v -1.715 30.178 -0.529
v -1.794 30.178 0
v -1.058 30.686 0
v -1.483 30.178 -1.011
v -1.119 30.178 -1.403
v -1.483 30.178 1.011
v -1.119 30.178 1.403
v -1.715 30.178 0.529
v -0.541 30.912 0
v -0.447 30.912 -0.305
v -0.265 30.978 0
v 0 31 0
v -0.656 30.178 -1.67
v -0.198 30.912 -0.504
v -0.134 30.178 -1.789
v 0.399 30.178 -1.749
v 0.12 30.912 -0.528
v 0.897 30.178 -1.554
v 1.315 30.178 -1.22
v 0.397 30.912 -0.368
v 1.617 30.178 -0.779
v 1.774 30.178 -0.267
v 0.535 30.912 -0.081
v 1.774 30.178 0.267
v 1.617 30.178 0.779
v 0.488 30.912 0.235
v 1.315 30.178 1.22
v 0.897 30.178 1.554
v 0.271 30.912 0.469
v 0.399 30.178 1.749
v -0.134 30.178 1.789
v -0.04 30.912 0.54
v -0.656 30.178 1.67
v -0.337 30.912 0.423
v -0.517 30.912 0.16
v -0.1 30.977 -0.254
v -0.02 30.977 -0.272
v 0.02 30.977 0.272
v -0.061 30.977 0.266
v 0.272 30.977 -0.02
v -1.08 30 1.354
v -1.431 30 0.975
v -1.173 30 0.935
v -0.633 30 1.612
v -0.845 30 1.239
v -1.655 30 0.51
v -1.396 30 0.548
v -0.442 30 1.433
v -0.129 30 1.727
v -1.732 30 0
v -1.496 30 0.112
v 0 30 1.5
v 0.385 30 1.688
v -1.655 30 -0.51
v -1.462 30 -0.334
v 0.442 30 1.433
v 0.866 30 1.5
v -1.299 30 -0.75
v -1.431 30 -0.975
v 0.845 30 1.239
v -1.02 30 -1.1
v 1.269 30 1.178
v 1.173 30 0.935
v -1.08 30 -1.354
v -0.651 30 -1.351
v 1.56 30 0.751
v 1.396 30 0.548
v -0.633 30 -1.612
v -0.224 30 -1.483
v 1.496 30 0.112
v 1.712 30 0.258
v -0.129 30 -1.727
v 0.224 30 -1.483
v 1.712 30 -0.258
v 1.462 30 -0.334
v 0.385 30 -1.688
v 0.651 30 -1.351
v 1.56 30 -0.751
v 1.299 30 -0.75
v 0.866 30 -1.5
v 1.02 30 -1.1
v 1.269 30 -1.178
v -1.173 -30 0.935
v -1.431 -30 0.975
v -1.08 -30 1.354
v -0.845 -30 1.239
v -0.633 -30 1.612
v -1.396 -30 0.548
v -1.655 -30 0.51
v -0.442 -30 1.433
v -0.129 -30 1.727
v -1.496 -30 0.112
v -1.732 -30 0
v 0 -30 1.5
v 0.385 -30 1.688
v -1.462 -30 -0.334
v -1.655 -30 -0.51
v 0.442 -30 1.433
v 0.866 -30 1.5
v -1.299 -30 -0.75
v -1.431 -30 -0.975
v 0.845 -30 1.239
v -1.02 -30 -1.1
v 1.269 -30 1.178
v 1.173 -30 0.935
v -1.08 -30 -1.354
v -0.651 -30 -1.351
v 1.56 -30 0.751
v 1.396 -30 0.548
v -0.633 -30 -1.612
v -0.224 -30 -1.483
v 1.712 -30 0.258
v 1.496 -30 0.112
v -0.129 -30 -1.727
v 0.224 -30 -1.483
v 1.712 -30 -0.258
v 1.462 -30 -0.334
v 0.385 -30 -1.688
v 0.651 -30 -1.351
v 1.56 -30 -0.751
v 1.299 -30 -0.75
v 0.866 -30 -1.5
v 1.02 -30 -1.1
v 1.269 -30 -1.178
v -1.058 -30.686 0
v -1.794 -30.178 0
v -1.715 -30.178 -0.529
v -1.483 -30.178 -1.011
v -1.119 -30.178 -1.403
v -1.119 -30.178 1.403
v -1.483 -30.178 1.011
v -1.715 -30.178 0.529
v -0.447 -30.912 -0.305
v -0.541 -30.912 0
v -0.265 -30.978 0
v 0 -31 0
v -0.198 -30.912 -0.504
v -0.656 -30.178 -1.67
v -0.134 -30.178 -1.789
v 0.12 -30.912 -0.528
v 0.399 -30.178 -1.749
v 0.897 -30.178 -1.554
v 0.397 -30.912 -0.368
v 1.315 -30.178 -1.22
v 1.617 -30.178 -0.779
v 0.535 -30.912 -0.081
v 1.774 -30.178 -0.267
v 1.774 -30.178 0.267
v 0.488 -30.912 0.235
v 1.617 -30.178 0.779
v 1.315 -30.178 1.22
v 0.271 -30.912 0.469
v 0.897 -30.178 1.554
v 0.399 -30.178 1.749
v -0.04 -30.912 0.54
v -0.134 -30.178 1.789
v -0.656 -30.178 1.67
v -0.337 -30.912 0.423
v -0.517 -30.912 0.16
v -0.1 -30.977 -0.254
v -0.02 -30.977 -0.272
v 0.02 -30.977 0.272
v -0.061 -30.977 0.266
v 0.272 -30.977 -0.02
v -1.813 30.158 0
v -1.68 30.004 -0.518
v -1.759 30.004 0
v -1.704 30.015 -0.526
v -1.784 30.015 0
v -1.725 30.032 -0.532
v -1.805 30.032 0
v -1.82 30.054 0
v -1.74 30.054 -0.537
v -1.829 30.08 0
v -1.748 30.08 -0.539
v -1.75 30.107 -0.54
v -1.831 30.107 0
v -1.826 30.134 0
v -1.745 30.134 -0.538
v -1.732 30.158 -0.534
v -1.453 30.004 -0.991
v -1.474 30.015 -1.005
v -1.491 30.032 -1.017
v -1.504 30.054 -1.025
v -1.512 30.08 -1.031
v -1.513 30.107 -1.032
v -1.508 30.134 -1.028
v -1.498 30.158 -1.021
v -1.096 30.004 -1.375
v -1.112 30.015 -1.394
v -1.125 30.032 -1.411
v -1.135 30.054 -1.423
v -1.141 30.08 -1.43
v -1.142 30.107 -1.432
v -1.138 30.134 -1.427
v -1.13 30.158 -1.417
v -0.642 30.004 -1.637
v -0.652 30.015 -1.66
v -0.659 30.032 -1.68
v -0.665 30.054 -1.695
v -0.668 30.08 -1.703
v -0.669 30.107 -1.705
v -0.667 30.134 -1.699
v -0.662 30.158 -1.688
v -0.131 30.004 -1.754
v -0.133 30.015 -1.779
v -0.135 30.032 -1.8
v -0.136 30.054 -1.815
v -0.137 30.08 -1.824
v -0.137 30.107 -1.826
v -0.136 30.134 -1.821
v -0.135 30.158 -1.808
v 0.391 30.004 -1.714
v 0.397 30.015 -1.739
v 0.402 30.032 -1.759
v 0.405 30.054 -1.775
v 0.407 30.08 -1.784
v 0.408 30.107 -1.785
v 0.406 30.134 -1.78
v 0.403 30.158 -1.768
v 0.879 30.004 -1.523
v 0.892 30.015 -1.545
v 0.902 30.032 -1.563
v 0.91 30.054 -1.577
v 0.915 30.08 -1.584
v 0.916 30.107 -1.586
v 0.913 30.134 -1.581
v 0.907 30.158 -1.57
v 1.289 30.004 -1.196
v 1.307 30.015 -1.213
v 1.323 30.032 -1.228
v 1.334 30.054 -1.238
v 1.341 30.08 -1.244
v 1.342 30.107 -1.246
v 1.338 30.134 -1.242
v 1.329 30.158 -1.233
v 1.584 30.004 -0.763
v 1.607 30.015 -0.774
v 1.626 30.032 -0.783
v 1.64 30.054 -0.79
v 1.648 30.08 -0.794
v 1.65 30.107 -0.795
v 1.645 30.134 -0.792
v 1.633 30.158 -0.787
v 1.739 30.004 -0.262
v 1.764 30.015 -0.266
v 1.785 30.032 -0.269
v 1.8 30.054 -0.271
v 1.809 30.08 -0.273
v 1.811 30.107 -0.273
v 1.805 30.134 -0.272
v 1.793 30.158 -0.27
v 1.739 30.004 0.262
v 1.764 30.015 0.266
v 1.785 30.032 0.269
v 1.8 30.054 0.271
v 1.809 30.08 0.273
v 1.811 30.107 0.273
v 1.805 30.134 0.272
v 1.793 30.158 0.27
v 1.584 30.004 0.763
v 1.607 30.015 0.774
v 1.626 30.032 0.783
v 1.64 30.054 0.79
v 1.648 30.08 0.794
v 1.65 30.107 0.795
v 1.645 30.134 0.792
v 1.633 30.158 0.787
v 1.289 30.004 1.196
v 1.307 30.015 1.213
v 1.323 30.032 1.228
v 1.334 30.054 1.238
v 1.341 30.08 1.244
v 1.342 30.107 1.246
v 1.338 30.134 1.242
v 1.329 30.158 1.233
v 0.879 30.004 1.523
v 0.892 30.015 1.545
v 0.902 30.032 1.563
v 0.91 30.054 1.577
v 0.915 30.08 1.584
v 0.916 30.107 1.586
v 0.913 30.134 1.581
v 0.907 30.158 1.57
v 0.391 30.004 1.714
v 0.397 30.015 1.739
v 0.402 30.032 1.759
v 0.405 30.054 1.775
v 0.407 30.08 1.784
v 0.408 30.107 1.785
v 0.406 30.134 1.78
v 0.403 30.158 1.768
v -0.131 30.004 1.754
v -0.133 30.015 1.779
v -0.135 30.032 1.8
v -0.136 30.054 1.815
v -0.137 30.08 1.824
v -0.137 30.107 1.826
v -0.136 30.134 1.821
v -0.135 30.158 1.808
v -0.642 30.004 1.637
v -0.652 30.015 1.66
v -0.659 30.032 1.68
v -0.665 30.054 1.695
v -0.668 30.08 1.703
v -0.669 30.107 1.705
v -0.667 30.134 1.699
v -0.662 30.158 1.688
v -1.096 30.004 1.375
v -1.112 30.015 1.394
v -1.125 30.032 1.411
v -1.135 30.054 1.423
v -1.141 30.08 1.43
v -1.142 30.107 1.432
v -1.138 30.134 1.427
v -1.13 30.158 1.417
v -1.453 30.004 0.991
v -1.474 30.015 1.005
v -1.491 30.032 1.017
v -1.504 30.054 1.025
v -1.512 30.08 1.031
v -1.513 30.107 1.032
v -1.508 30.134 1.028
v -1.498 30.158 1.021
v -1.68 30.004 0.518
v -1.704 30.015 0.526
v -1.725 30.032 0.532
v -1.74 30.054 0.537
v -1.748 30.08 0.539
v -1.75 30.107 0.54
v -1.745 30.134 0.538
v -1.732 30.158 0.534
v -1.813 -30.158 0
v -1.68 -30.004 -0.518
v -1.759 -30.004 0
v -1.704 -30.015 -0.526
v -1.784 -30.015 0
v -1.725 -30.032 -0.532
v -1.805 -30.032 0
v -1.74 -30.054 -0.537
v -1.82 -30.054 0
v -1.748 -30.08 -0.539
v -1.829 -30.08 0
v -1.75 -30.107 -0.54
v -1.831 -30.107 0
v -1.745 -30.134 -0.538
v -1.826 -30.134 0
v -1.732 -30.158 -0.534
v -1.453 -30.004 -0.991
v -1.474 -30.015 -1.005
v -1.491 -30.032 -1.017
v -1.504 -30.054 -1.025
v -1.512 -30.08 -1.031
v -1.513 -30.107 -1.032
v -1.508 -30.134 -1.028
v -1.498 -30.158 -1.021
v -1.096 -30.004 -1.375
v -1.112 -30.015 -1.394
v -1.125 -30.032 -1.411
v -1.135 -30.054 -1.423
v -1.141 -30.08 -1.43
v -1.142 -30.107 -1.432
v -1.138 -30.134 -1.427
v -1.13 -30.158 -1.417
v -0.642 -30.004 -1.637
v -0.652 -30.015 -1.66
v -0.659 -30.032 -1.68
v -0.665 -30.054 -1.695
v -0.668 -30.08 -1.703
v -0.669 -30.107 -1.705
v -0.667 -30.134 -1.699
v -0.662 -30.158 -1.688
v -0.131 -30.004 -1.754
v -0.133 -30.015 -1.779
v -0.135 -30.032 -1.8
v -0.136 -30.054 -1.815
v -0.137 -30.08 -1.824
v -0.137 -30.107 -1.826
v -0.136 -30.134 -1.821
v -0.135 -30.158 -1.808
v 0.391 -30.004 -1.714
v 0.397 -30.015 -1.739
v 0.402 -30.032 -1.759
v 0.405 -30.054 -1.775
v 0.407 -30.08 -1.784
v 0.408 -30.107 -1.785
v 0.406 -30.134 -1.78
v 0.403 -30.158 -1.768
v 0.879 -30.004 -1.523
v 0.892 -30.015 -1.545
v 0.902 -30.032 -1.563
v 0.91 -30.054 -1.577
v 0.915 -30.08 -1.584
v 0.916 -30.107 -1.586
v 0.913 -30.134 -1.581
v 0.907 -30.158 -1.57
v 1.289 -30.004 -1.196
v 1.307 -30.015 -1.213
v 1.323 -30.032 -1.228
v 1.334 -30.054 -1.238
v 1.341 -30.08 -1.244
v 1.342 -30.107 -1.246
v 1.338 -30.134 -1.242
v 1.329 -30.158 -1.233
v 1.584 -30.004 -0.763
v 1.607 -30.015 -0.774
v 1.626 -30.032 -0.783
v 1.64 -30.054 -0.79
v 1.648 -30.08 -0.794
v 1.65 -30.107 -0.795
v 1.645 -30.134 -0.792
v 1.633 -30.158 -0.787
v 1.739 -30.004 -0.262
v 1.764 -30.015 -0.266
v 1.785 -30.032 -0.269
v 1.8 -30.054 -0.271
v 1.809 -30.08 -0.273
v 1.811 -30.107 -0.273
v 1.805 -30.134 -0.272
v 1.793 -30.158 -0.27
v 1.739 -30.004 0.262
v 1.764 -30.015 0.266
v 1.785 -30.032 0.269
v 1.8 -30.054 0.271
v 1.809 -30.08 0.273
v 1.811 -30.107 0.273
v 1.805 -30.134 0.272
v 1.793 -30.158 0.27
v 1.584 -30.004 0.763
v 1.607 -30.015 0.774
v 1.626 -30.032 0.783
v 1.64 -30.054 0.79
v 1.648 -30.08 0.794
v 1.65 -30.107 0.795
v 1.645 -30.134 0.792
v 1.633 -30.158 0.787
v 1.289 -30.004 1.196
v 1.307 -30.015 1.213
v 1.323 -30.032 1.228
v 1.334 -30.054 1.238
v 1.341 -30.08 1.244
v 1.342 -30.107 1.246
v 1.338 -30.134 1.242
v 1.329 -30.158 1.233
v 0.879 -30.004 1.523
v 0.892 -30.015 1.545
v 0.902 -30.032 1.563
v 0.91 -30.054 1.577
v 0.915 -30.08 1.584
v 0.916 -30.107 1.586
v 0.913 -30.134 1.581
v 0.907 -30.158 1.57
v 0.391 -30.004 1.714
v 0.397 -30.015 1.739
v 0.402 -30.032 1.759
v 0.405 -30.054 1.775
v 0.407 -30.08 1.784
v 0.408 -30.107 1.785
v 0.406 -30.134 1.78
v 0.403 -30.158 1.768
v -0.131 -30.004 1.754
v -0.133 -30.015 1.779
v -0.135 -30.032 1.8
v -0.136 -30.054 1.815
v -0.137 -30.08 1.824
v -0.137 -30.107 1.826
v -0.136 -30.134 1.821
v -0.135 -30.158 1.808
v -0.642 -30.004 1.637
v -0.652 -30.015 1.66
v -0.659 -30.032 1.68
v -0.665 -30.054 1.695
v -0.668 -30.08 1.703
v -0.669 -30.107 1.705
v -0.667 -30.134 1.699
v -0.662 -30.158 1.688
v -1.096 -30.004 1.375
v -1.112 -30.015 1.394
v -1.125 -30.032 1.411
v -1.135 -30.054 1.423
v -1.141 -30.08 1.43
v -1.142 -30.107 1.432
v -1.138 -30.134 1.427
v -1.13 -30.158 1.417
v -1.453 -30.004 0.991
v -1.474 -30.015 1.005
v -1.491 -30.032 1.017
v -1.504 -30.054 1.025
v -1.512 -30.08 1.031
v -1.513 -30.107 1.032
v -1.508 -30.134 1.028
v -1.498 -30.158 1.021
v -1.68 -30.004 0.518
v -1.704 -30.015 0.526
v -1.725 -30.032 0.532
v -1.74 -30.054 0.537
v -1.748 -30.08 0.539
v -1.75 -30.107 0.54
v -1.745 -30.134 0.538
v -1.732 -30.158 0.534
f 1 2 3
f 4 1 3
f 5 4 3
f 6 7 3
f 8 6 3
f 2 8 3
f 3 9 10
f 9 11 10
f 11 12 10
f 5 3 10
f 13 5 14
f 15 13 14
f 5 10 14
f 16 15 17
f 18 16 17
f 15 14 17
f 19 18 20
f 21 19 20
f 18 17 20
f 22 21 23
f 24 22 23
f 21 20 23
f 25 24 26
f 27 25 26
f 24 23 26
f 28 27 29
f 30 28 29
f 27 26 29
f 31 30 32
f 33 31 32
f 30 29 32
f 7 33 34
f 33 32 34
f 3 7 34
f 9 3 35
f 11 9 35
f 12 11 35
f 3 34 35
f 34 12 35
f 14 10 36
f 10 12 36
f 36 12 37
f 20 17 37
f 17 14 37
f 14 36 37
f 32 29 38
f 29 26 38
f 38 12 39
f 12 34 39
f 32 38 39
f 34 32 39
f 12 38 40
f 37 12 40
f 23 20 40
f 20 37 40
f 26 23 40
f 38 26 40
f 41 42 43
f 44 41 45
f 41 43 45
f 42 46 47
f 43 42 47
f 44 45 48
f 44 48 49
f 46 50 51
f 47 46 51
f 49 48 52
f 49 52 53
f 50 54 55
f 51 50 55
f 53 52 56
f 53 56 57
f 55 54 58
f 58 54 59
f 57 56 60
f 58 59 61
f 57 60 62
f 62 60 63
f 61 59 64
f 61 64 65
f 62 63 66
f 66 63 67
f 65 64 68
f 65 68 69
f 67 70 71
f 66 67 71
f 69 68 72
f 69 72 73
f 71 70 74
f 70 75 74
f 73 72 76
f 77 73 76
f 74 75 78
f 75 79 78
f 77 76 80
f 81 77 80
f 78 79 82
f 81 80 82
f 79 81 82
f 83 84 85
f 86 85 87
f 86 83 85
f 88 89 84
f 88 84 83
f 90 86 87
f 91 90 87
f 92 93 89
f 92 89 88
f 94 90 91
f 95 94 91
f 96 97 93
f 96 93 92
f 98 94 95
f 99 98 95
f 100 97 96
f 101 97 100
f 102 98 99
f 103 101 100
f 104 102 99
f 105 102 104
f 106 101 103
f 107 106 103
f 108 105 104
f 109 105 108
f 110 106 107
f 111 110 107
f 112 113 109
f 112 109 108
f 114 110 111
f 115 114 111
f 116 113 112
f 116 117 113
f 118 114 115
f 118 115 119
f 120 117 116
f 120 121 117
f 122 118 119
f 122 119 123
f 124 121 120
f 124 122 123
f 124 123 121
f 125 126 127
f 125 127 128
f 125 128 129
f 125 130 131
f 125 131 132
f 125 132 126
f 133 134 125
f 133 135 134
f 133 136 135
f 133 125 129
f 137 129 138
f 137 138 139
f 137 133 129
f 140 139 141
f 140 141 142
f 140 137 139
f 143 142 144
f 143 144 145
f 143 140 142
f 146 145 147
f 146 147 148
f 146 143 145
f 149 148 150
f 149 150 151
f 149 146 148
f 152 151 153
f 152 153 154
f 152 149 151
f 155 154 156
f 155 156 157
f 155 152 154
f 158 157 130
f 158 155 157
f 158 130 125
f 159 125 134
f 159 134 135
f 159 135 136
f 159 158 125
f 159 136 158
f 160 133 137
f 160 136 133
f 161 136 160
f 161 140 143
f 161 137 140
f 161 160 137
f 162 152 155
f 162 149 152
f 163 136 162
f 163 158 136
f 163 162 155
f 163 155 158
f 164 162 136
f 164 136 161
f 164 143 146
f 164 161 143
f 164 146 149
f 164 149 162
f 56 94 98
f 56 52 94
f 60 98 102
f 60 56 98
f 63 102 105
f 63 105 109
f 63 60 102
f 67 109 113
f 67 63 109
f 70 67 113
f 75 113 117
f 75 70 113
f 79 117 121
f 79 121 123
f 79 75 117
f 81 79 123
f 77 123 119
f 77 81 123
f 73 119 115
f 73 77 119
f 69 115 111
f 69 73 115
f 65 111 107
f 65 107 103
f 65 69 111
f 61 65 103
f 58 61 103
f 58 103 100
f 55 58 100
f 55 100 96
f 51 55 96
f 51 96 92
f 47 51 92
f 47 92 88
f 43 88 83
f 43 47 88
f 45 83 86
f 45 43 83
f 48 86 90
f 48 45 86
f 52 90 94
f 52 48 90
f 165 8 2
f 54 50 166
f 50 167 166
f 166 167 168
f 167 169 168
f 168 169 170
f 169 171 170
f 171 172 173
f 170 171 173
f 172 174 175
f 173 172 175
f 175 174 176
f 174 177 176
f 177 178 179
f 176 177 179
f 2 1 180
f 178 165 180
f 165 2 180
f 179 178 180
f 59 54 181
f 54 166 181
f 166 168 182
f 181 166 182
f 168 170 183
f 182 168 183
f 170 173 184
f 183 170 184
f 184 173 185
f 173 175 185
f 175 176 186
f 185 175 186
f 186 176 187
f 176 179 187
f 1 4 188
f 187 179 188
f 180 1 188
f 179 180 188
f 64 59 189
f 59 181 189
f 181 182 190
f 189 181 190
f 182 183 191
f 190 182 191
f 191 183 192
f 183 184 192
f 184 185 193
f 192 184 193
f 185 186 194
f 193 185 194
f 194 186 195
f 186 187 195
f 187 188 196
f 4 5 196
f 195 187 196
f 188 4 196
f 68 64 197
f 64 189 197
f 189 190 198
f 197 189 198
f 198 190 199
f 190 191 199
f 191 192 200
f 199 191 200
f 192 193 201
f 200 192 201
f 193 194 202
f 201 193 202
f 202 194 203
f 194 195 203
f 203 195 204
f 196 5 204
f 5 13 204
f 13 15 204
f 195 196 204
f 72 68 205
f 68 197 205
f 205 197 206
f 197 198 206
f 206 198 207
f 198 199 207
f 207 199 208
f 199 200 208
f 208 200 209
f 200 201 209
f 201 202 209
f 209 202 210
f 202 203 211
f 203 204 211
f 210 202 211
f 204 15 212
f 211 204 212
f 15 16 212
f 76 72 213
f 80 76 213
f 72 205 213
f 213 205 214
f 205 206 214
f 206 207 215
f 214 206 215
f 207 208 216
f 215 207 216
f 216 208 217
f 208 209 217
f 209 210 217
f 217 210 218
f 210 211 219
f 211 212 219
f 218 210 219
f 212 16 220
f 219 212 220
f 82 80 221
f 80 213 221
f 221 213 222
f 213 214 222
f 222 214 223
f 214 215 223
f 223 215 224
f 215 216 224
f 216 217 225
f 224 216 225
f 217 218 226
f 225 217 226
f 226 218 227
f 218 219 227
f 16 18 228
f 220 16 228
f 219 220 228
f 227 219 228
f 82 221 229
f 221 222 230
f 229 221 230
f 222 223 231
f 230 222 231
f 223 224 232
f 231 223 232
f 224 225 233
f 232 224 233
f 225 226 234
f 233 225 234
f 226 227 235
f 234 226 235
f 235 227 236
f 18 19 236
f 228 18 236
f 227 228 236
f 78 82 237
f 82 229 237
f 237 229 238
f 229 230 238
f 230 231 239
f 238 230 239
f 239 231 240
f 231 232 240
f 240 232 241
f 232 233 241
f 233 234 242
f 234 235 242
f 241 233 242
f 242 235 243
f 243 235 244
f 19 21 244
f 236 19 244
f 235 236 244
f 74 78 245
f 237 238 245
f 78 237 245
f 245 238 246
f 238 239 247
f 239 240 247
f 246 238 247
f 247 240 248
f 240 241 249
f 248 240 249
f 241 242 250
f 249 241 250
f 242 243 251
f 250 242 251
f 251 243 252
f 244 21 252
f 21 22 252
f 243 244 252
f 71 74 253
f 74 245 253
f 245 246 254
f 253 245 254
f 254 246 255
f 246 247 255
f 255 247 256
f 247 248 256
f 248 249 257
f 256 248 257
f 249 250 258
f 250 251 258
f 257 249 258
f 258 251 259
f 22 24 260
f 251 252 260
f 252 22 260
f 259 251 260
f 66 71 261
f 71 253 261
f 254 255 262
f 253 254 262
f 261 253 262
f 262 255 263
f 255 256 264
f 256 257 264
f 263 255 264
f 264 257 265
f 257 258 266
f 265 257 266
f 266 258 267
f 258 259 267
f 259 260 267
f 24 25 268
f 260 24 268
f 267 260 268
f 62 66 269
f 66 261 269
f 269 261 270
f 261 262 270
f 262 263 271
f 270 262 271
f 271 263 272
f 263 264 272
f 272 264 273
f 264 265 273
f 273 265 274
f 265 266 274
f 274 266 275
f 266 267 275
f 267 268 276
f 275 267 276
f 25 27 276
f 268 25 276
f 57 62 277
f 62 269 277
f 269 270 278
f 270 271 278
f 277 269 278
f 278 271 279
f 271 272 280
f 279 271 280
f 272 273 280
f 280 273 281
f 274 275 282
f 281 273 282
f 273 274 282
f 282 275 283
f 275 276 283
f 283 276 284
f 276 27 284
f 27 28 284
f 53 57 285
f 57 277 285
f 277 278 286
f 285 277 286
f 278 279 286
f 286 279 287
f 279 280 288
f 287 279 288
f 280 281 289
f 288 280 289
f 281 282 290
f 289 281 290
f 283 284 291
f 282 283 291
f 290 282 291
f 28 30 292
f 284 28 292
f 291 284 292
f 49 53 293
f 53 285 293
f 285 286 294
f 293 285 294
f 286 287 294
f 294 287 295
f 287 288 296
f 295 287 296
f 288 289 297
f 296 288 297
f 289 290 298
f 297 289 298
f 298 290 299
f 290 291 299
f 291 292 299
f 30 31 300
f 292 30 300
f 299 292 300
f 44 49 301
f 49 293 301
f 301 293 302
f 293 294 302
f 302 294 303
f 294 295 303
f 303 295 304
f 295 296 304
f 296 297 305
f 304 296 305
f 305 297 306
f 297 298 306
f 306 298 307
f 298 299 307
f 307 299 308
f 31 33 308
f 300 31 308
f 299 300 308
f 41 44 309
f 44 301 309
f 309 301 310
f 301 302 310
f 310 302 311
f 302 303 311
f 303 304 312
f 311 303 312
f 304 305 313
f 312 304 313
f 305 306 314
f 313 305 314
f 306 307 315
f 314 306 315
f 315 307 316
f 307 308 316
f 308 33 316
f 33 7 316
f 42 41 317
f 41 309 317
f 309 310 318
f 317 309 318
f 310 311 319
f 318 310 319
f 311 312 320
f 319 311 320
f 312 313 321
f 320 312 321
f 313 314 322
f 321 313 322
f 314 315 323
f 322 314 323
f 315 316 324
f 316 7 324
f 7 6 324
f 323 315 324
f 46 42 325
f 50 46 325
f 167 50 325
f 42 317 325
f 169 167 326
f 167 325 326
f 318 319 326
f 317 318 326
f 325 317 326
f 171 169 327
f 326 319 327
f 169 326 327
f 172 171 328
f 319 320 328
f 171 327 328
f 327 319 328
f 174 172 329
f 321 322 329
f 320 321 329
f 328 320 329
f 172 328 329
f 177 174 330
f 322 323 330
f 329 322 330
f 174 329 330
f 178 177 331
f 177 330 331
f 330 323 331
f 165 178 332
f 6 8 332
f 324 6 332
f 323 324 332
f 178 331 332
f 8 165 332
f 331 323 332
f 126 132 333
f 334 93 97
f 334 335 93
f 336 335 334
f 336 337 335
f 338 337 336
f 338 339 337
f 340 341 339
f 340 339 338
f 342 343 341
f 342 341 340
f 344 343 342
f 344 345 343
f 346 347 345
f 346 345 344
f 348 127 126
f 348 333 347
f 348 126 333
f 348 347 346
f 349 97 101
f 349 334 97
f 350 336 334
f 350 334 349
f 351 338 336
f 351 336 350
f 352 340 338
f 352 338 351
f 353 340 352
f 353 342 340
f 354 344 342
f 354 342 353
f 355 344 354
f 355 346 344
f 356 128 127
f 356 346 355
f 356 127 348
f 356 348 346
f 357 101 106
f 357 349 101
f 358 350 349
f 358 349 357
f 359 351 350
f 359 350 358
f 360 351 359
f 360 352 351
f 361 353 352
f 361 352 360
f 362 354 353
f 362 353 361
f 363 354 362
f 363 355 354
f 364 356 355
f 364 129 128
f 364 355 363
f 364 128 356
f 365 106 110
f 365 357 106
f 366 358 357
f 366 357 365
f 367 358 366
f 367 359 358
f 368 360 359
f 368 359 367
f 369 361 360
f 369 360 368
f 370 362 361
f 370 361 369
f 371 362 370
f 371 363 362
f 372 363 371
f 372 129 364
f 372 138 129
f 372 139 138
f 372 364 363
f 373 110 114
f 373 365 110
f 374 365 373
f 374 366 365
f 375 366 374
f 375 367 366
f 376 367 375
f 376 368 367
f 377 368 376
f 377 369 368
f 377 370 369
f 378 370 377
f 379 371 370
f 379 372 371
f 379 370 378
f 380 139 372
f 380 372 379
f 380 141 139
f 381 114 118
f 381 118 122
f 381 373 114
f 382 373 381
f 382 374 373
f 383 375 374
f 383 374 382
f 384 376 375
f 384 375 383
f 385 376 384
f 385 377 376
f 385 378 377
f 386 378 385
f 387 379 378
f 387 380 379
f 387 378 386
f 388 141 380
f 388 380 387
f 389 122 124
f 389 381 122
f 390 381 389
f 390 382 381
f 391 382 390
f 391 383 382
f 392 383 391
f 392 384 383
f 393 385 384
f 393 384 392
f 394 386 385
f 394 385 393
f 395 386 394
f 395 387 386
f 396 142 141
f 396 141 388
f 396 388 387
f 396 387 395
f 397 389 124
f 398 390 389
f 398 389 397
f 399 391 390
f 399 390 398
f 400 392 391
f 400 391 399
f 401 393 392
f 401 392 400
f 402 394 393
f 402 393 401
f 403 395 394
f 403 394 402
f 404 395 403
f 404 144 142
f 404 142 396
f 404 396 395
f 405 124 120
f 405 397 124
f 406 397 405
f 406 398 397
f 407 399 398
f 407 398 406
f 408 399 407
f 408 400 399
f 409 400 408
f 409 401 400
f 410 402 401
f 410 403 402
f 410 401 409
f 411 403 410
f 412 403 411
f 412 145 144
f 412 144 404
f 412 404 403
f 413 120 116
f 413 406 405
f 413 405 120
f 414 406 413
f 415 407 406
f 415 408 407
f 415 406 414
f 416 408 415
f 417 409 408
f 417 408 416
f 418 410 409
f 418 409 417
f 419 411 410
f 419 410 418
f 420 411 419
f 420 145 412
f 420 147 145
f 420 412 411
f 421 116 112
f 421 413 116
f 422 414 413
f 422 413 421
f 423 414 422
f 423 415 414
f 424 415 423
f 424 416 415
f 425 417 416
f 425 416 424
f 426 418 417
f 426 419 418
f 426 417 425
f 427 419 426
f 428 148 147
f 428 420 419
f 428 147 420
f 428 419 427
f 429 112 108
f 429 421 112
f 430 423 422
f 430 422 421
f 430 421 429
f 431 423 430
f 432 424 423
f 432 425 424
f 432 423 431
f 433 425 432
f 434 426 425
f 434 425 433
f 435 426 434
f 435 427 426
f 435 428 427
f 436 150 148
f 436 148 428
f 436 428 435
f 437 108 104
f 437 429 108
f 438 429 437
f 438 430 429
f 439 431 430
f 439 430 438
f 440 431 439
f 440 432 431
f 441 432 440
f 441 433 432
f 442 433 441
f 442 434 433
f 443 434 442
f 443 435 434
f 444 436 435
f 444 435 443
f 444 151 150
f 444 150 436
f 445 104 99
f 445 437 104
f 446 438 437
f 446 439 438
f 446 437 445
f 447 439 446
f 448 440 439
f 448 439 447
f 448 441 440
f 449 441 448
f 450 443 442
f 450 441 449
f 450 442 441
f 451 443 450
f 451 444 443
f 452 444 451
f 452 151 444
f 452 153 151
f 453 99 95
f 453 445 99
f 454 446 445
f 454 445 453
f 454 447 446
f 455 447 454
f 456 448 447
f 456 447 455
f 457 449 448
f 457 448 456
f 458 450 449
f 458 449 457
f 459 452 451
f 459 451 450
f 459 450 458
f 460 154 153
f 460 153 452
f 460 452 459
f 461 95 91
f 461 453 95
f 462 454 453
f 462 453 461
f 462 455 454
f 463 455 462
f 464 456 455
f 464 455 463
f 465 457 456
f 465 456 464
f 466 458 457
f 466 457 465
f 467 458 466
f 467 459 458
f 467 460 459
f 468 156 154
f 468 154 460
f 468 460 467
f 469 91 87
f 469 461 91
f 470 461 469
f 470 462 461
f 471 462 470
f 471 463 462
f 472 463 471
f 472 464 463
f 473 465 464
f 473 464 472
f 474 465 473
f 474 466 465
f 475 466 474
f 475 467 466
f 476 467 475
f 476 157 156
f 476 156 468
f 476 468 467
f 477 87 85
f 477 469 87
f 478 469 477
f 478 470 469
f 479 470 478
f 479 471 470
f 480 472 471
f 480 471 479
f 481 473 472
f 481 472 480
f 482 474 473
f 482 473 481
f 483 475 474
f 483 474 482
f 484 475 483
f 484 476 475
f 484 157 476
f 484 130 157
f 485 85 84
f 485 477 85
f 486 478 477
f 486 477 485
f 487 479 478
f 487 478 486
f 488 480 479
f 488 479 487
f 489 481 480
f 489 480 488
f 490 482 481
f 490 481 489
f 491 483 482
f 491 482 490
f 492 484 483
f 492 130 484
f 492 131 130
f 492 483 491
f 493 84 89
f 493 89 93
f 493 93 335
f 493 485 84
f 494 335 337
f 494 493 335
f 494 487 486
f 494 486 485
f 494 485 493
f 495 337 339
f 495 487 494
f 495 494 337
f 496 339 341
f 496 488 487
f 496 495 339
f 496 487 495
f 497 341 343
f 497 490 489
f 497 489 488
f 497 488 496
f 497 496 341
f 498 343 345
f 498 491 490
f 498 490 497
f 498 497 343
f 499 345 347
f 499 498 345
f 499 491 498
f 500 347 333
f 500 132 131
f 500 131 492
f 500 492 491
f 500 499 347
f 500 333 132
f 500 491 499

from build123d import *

# Parameters (mm, degrees)
SKETCH1_R           = 1.5
BOSS_EXTRUDE1_DEPTH = 30


with BuildPart() as part:
    # Sketch1 → Boss-Extrude1 (new, symmetric)
    with BuildSketch(Plane(origin=(0, 0, 0), x_dir=(1, 0, 0), z_dir=(0, 1, 0))):
        with Locations(Location((0, 0, 0), (0, 0, 270))):
            Circle(SKETCH1_R)
    extrude(amount=BOSS_EXTRUDE1_DEPTH, both=True)

    # Sketch2 → Revolve1 (revolve)
    with BuildSketch(Plane.XY):
        with BuildLine():
            Line((0, 30), (-1.731543481, 30))
            ThreePointArc((-1.731543481, 30), (-1.825836483, 30.066700905), (-1.794340914, 30.177823405))
            add(Edge.make_bspline(
                [(-1.794340914, 30.177823405), (-1.296972614, 30.579160925), (-0.657911989, 31), (0, 31)],
                knots=[0, 0, 0, 0, 1, 1, 1, 1], degree=3))
            Line((0, 31), (0, 30))
        make_face()
    revolve1 = revolve(axis=Axis((0, 31, 0), (0, -1, 0)))

    # Mirror1: Revolve1 across plane
    add(revolve1.mirror(Plane.ZX))


solid = part.part
